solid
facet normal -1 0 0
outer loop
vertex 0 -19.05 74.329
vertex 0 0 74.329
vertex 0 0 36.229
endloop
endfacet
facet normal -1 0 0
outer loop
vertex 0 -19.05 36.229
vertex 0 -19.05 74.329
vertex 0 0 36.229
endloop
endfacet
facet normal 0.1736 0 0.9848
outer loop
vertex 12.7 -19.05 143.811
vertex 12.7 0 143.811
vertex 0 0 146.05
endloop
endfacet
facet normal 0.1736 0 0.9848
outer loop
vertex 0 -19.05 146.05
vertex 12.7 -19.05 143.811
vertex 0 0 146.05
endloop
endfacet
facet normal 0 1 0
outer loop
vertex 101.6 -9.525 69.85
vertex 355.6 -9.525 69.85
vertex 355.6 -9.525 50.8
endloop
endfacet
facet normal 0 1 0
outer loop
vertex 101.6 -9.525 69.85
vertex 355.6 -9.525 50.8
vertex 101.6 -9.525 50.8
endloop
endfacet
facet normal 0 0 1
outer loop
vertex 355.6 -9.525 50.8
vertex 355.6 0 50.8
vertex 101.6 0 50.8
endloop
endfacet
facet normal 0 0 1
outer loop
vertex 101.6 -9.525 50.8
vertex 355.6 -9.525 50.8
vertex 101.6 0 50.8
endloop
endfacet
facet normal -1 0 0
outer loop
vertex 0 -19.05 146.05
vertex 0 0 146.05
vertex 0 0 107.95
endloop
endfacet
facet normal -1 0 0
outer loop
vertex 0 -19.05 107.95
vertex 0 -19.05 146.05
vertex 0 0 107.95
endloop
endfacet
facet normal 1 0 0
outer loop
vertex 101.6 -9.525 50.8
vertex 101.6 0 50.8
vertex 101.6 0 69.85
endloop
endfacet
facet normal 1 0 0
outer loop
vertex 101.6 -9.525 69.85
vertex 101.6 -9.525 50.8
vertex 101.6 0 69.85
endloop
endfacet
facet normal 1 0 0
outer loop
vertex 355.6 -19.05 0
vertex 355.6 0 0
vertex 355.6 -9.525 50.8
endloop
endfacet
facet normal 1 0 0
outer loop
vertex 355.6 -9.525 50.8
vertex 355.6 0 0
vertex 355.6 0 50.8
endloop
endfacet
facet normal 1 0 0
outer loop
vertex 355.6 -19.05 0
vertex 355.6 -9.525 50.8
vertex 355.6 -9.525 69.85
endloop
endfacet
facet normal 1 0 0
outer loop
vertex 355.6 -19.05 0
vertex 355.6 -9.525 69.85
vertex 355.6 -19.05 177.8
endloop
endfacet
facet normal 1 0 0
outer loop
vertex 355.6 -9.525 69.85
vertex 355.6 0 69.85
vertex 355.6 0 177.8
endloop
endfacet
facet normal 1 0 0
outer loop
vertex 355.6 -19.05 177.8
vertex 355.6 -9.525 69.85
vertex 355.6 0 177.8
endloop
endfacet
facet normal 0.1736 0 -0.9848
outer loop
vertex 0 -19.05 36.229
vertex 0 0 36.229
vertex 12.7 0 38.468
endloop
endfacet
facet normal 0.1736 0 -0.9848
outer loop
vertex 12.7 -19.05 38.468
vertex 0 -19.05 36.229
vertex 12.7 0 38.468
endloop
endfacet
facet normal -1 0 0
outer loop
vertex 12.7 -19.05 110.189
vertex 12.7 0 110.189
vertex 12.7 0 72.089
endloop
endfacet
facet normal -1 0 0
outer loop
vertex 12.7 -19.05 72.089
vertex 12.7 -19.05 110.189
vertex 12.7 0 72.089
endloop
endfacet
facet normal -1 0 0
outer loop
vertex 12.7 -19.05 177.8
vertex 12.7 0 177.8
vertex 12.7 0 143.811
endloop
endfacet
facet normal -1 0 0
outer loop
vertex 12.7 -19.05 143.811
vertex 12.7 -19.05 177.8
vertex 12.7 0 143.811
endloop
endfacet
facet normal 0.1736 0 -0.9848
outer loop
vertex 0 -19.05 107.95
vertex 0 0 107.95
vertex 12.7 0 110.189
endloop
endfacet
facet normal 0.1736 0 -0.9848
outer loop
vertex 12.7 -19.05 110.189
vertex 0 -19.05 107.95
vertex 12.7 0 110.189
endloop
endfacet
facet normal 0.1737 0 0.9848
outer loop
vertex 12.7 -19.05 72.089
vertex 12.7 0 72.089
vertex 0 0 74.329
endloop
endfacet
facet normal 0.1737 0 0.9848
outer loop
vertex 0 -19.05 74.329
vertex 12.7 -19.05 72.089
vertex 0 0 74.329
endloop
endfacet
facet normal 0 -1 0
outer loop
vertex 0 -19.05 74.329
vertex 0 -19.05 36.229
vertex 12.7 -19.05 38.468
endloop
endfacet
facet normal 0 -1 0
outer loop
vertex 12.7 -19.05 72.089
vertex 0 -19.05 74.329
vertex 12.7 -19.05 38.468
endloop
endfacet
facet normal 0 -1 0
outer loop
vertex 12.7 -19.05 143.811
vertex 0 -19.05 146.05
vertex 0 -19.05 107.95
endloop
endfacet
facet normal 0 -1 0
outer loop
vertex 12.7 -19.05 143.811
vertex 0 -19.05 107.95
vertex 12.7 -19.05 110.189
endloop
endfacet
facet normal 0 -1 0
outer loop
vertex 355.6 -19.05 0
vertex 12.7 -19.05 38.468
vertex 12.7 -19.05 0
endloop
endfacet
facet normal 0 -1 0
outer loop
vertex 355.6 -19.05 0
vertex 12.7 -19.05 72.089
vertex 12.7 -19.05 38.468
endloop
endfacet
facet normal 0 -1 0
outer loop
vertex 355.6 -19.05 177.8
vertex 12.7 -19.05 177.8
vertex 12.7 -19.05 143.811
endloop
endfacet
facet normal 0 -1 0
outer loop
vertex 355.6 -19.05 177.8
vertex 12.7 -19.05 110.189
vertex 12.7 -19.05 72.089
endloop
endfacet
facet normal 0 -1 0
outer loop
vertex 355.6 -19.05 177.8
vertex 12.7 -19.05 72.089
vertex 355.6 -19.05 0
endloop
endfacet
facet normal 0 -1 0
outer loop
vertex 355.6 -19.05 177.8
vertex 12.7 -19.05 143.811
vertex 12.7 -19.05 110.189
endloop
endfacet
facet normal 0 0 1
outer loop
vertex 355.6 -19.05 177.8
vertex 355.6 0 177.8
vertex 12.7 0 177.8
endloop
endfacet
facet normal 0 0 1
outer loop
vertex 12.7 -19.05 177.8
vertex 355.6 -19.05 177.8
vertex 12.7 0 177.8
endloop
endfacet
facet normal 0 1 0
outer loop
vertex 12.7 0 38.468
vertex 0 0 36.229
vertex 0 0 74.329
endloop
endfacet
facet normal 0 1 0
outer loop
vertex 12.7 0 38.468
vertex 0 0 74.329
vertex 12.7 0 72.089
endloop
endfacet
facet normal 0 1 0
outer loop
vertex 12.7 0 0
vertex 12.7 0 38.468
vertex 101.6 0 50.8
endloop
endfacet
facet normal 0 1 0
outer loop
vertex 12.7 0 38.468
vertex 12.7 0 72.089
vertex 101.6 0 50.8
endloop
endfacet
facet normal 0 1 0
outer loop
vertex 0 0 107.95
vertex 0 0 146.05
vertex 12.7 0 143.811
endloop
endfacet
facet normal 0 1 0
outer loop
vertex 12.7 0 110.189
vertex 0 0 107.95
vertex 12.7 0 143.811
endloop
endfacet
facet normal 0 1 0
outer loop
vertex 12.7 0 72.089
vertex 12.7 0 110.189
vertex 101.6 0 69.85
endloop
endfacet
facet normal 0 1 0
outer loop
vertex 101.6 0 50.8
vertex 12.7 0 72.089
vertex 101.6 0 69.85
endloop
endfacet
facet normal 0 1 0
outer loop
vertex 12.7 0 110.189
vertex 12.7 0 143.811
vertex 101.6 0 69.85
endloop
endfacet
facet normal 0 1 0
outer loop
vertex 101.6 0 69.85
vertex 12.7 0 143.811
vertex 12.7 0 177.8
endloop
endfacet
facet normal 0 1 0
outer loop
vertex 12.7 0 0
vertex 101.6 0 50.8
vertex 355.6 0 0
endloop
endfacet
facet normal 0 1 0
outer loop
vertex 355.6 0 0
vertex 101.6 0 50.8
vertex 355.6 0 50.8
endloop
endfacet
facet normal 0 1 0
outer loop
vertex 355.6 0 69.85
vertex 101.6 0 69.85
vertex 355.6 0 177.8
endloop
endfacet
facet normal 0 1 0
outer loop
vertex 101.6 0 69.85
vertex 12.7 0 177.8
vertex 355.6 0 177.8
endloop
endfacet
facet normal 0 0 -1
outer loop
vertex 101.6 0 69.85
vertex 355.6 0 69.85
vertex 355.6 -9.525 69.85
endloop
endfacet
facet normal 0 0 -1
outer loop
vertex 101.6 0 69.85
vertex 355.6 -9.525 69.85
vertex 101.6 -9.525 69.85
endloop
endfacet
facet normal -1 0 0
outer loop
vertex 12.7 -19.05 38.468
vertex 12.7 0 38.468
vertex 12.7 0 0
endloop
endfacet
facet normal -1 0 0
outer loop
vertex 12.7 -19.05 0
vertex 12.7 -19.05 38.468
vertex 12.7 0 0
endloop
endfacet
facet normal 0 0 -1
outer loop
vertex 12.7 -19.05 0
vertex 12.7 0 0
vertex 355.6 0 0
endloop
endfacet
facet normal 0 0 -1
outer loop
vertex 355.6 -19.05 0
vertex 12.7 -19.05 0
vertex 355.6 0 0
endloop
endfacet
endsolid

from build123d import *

# Parameters (mm, degrees)
F1_DEPTH = 19.05
F2_W     = 254
F2_H     = 19.05
F3_DEPTH = 9.525


with BuildPart() as f1:
    # F0 (on Front) → F1 (new body)
    with BuildSketch(Plane.XZ):
        Polygon((12.7, 38.468058), (12.7, 0), (355.6, 0), (355.6, 177.8), (12.7, 177.8), (12.7, 143.810647), (0, 146.05), (0, 107.95), (12.7, 110.189353), (12.7, 72.089353), (0, 74.328705), (0, 36.228705), align=None)
    extrude(amount=F1_DEPTH)

    # F2 (on face) → F3 (cut)
    with BuildSketch(Plane(origin=(0, 0, 0), x_dir=(-1, 0, 0), z_dir=(0, 1, 0))):
        with Locations((-228.6, 60.325)):
            Rectangle(F2_W, F2_H)
    extrude(amount=-F3_DEPTH, mode=Mode.SUBTRACT)


solid = f1.part
